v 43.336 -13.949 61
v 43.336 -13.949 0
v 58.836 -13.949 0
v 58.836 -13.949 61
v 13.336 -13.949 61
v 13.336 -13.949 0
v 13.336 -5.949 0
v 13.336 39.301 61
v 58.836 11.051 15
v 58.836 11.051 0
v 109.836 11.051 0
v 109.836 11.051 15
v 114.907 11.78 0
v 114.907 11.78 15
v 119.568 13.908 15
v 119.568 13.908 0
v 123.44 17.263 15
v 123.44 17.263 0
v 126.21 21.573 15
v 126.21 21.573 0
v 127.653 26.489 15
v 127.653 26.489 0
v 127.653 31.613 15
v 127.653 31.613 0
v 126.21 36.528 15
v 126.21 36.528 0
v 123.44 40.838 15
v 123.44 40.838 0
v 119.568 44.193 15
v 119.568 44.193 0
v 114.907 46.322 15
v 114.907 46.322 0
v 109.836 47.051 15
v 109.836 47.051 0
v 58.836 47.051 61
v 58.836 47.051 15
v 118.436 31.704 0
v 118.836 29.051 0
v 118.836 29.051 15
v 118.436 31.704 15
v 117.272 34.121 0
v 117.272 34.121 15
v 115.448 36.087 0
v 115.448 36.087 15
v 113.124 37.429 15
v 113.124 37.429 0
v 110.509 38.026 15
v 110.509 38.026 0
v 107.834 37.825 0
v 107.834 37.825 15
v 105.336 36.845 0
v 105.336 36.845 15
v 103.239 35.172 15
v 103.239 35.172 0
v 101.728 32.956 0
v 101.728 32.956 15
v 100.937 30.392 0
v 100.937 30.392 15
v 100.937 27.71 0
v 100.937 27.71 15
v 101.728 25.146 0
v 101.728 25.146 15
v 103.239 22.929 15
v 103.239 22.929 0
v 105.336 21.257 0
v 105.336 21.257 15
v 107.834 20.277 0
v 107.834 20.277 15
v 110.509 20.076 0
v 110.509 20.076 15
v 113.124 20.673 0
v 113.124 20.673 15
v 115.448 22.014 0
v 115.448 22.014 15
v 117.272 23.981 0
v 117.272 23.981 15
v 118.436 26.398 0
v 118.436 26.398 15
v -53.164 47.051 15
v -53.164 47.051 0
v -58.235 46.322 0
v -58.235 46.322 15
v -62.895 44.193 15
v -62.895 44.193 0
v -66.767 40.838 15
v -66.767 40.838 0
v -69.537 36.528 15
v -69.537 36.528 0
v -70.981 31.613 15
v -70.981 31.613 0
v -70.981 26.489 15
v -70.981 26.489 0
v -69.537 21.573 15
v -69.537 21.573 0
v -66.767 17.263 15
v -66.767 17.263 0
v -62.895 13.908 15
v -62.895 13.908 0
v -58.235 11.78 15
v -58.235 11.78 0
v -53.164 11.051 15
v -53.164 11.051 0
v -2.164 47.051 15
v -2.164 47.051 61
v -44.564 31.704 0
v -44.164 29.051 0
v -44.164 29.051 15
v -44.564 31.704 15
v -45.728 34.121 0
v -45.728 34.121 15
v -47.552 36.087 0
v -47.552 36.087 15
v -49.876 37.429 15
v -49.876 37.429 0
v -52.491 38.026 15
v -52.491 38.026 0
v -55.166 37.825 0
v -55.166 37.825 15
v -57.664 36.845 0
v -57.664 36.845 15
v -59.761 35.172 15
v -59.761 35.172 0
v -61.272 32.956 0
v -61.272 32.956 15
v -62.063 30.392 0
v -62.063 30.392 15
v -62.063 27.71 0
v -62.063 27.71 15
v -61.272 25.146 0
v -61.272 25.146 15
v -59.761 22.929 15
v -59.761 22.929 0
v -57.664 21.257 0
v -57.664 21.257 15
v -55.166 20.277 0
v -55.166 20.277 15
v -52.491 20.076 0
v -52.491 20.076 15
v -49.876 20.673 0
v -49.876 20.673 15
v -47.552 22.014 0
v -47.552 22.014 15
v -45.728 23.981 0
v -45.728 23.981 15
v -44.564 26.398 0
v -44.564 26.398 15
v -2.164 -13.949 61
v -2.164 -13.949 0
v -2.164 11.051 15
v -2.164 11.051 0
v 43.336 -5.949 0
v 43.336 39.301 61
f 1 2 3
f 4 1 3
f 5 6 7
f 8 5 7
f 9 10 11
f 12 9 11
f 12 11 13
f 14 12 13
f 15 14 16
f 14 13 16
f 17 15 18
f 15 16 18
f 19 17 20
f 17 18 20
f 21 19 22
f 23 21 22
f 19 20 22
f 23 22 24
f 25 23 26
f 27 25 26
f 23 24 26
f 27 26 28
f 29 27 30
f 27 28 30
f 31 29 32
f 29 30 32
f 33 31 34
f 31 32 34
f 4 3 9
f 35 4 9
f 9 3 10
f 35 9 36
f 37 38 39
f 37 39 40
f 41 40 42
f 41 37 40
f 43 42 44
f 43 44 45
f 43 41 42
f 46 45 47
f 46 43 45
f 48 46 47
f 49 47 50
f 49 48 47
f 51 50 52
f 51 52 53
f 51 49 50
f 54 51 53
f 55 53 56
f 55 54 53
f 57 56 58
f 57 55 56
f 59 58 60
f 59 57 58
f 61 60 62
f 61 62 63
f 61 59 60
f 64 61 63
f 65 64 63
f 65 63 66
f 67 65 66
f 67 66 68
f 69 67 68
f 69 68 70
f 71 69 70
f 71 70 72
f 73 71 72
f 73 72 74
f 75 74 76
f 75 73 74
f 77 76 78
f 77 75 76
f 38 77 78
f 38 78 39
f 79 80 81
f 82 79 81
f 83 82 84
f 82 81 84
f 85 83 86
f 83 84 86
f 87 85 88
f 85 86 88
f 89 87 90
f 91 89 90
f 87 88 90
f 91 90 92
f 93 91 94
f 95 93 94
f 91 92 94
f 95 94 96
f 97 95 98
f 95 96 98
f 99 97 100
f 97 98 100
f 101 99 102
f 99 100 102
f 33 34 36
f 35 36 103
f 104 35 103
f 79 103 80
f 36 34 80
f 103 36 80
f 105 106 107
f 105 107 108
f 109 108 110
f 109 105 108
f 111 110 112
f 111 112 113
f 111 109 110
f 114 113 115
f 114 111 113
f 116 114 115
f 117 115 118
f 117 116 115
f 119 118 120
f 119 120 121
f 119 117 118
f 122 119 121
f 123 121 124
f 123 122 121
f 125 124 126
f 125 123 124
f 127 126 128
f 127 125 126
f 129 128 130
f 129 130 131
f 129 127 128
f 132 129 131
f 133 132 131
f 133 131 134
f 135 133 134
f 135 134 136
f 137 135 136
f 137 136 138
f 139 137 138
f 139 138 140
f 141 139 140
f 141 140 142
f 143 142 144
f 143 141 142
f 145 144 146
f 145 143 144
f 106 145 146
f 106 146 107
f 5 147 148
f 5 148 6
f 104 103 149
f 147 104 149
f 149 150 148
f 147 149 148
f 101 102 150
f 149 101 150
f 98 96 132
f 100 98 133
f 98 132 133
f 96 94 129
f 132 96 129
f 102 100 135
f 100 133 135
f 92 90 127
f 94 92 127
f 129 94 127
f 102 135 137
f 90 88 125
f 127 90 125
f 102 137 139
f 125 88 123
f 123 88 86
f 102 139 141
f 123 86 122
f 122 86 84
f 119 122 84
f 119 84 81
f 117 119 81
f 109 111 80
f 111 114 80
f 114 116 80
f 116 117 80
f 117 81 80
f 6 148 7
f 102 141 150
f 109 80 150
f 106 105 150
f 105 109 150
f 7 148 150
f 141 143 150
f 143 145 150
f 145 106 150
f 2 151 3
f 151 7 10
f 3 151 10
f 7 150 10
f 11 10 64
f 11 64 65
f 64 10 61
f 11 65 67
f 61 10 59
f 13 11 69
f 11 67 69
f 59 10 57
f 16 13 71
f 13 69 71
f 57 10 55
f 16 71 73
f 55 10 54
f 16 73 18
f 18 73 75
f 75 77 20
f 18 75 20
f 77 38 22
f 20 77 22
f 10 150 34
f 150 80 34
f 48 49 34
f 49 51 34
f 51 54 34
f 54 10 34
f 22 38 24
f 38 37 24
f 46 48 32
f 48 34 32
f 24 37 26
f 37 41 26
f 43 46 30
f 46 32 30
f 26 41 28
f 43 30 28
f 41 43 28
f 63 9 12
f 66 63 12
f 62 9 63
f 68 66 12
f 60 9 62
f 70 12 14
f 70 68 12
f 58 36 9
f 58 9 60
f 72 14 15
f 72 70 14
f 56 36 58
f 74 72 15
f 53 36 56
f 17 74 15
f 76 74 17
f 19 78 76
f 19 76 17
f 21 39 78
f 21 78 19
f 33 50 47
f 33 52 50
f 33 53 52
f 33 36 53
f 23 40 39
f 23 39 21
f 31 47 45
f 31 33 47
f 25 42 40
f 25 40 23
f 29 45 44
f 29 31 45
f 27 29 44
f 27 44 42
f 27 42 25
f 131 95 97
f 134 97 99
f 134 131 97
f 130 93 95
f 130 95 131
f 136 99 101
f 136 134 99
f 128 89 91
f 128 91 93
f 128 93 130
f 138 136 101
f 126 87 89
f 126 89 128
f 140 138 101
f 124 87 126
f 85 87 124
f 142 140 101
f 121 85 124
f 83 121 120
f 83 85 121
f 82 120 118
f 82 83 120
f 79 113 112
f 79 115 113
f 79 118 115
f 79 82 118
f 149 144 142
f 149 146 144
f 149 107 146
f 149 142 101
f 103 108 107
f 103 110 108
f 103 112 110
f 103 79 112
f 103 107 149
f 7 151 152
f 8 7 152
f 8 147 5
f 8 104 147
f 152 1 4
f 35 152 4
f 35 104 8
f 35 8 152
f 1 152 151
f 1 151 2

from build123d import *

# Parameters (mm, degrees)
F1_DEPTH = 61
F3_DEPTH = 30
F0_R     = 9
F4_DEPTH = 15


with BuildPart() as f1:
    # F0 (on Top) → F1 (new body)
    with BuildSketch(Plane.XY):
        Polygon((-2.163718, 11.050885), (-2.163718, -13.949115), (13.336282, -13.949115), (13.336282, 39.300885), (43.336282, 39.300885), (43.336282, -13.949115), (58.836282, -13.949115), (58.836282, 11.050885), (58.836282, 47.050885), (-2.163718, 47.050885), align=None)
    extrude(amount=F1_DEPTH)

    # F2 (on face) → F3 (join)
    with BuildSketch(Plane(origin=(43.336282, 0, 0), x_dir=(0, -1, 0), z_dir=(-1, 0, 0))):
        Polygon((-39.300885, 0), (5.949115, 0), (-39.300885, 61), align=None)
    extrude(amount=F3_DEPTH)

    # F0 (on Top) → F4 (join)
    with BuildSketch(Plane.XY):
        with BuildLine():
            Line((-53.163718, 11.050885), (-2.163718, 11.050885))
            Line((-2.163718, 11.050885), (-2.163718, 47.050885))
            Line((-2.163718, 47.050885), (-53.163718, 47.050885))
            ThreePointArc((-53.163718, 47.050885), (-71.163718, 29.050885), (-53.163718, 11.050885))
        make_face()
        with Locations((-53.163718, 29.050885)):
            Circle(F0_R, mode=Mode.SUBTRACT)
        with BuildLine():
            Line((109.836282, 47.050885), (58.836282, 47.050885))
            Line((58.836282, 47.050885), (58.836282, 11.050885))
            Line((58.836282, 11.050885), (109.836282, 11.050885))
            ThreePointArc((109.836282, 11.050885), (127.836282, 29.050885), (109.836282, 47.050885))
        make_face()
        with Locations((109.836282, 29.050885)):
            Circle(F0_R, mode=Mode.SUBTRACT)
    extrude(amount=F4_DEPTH)


solid = f1.part
